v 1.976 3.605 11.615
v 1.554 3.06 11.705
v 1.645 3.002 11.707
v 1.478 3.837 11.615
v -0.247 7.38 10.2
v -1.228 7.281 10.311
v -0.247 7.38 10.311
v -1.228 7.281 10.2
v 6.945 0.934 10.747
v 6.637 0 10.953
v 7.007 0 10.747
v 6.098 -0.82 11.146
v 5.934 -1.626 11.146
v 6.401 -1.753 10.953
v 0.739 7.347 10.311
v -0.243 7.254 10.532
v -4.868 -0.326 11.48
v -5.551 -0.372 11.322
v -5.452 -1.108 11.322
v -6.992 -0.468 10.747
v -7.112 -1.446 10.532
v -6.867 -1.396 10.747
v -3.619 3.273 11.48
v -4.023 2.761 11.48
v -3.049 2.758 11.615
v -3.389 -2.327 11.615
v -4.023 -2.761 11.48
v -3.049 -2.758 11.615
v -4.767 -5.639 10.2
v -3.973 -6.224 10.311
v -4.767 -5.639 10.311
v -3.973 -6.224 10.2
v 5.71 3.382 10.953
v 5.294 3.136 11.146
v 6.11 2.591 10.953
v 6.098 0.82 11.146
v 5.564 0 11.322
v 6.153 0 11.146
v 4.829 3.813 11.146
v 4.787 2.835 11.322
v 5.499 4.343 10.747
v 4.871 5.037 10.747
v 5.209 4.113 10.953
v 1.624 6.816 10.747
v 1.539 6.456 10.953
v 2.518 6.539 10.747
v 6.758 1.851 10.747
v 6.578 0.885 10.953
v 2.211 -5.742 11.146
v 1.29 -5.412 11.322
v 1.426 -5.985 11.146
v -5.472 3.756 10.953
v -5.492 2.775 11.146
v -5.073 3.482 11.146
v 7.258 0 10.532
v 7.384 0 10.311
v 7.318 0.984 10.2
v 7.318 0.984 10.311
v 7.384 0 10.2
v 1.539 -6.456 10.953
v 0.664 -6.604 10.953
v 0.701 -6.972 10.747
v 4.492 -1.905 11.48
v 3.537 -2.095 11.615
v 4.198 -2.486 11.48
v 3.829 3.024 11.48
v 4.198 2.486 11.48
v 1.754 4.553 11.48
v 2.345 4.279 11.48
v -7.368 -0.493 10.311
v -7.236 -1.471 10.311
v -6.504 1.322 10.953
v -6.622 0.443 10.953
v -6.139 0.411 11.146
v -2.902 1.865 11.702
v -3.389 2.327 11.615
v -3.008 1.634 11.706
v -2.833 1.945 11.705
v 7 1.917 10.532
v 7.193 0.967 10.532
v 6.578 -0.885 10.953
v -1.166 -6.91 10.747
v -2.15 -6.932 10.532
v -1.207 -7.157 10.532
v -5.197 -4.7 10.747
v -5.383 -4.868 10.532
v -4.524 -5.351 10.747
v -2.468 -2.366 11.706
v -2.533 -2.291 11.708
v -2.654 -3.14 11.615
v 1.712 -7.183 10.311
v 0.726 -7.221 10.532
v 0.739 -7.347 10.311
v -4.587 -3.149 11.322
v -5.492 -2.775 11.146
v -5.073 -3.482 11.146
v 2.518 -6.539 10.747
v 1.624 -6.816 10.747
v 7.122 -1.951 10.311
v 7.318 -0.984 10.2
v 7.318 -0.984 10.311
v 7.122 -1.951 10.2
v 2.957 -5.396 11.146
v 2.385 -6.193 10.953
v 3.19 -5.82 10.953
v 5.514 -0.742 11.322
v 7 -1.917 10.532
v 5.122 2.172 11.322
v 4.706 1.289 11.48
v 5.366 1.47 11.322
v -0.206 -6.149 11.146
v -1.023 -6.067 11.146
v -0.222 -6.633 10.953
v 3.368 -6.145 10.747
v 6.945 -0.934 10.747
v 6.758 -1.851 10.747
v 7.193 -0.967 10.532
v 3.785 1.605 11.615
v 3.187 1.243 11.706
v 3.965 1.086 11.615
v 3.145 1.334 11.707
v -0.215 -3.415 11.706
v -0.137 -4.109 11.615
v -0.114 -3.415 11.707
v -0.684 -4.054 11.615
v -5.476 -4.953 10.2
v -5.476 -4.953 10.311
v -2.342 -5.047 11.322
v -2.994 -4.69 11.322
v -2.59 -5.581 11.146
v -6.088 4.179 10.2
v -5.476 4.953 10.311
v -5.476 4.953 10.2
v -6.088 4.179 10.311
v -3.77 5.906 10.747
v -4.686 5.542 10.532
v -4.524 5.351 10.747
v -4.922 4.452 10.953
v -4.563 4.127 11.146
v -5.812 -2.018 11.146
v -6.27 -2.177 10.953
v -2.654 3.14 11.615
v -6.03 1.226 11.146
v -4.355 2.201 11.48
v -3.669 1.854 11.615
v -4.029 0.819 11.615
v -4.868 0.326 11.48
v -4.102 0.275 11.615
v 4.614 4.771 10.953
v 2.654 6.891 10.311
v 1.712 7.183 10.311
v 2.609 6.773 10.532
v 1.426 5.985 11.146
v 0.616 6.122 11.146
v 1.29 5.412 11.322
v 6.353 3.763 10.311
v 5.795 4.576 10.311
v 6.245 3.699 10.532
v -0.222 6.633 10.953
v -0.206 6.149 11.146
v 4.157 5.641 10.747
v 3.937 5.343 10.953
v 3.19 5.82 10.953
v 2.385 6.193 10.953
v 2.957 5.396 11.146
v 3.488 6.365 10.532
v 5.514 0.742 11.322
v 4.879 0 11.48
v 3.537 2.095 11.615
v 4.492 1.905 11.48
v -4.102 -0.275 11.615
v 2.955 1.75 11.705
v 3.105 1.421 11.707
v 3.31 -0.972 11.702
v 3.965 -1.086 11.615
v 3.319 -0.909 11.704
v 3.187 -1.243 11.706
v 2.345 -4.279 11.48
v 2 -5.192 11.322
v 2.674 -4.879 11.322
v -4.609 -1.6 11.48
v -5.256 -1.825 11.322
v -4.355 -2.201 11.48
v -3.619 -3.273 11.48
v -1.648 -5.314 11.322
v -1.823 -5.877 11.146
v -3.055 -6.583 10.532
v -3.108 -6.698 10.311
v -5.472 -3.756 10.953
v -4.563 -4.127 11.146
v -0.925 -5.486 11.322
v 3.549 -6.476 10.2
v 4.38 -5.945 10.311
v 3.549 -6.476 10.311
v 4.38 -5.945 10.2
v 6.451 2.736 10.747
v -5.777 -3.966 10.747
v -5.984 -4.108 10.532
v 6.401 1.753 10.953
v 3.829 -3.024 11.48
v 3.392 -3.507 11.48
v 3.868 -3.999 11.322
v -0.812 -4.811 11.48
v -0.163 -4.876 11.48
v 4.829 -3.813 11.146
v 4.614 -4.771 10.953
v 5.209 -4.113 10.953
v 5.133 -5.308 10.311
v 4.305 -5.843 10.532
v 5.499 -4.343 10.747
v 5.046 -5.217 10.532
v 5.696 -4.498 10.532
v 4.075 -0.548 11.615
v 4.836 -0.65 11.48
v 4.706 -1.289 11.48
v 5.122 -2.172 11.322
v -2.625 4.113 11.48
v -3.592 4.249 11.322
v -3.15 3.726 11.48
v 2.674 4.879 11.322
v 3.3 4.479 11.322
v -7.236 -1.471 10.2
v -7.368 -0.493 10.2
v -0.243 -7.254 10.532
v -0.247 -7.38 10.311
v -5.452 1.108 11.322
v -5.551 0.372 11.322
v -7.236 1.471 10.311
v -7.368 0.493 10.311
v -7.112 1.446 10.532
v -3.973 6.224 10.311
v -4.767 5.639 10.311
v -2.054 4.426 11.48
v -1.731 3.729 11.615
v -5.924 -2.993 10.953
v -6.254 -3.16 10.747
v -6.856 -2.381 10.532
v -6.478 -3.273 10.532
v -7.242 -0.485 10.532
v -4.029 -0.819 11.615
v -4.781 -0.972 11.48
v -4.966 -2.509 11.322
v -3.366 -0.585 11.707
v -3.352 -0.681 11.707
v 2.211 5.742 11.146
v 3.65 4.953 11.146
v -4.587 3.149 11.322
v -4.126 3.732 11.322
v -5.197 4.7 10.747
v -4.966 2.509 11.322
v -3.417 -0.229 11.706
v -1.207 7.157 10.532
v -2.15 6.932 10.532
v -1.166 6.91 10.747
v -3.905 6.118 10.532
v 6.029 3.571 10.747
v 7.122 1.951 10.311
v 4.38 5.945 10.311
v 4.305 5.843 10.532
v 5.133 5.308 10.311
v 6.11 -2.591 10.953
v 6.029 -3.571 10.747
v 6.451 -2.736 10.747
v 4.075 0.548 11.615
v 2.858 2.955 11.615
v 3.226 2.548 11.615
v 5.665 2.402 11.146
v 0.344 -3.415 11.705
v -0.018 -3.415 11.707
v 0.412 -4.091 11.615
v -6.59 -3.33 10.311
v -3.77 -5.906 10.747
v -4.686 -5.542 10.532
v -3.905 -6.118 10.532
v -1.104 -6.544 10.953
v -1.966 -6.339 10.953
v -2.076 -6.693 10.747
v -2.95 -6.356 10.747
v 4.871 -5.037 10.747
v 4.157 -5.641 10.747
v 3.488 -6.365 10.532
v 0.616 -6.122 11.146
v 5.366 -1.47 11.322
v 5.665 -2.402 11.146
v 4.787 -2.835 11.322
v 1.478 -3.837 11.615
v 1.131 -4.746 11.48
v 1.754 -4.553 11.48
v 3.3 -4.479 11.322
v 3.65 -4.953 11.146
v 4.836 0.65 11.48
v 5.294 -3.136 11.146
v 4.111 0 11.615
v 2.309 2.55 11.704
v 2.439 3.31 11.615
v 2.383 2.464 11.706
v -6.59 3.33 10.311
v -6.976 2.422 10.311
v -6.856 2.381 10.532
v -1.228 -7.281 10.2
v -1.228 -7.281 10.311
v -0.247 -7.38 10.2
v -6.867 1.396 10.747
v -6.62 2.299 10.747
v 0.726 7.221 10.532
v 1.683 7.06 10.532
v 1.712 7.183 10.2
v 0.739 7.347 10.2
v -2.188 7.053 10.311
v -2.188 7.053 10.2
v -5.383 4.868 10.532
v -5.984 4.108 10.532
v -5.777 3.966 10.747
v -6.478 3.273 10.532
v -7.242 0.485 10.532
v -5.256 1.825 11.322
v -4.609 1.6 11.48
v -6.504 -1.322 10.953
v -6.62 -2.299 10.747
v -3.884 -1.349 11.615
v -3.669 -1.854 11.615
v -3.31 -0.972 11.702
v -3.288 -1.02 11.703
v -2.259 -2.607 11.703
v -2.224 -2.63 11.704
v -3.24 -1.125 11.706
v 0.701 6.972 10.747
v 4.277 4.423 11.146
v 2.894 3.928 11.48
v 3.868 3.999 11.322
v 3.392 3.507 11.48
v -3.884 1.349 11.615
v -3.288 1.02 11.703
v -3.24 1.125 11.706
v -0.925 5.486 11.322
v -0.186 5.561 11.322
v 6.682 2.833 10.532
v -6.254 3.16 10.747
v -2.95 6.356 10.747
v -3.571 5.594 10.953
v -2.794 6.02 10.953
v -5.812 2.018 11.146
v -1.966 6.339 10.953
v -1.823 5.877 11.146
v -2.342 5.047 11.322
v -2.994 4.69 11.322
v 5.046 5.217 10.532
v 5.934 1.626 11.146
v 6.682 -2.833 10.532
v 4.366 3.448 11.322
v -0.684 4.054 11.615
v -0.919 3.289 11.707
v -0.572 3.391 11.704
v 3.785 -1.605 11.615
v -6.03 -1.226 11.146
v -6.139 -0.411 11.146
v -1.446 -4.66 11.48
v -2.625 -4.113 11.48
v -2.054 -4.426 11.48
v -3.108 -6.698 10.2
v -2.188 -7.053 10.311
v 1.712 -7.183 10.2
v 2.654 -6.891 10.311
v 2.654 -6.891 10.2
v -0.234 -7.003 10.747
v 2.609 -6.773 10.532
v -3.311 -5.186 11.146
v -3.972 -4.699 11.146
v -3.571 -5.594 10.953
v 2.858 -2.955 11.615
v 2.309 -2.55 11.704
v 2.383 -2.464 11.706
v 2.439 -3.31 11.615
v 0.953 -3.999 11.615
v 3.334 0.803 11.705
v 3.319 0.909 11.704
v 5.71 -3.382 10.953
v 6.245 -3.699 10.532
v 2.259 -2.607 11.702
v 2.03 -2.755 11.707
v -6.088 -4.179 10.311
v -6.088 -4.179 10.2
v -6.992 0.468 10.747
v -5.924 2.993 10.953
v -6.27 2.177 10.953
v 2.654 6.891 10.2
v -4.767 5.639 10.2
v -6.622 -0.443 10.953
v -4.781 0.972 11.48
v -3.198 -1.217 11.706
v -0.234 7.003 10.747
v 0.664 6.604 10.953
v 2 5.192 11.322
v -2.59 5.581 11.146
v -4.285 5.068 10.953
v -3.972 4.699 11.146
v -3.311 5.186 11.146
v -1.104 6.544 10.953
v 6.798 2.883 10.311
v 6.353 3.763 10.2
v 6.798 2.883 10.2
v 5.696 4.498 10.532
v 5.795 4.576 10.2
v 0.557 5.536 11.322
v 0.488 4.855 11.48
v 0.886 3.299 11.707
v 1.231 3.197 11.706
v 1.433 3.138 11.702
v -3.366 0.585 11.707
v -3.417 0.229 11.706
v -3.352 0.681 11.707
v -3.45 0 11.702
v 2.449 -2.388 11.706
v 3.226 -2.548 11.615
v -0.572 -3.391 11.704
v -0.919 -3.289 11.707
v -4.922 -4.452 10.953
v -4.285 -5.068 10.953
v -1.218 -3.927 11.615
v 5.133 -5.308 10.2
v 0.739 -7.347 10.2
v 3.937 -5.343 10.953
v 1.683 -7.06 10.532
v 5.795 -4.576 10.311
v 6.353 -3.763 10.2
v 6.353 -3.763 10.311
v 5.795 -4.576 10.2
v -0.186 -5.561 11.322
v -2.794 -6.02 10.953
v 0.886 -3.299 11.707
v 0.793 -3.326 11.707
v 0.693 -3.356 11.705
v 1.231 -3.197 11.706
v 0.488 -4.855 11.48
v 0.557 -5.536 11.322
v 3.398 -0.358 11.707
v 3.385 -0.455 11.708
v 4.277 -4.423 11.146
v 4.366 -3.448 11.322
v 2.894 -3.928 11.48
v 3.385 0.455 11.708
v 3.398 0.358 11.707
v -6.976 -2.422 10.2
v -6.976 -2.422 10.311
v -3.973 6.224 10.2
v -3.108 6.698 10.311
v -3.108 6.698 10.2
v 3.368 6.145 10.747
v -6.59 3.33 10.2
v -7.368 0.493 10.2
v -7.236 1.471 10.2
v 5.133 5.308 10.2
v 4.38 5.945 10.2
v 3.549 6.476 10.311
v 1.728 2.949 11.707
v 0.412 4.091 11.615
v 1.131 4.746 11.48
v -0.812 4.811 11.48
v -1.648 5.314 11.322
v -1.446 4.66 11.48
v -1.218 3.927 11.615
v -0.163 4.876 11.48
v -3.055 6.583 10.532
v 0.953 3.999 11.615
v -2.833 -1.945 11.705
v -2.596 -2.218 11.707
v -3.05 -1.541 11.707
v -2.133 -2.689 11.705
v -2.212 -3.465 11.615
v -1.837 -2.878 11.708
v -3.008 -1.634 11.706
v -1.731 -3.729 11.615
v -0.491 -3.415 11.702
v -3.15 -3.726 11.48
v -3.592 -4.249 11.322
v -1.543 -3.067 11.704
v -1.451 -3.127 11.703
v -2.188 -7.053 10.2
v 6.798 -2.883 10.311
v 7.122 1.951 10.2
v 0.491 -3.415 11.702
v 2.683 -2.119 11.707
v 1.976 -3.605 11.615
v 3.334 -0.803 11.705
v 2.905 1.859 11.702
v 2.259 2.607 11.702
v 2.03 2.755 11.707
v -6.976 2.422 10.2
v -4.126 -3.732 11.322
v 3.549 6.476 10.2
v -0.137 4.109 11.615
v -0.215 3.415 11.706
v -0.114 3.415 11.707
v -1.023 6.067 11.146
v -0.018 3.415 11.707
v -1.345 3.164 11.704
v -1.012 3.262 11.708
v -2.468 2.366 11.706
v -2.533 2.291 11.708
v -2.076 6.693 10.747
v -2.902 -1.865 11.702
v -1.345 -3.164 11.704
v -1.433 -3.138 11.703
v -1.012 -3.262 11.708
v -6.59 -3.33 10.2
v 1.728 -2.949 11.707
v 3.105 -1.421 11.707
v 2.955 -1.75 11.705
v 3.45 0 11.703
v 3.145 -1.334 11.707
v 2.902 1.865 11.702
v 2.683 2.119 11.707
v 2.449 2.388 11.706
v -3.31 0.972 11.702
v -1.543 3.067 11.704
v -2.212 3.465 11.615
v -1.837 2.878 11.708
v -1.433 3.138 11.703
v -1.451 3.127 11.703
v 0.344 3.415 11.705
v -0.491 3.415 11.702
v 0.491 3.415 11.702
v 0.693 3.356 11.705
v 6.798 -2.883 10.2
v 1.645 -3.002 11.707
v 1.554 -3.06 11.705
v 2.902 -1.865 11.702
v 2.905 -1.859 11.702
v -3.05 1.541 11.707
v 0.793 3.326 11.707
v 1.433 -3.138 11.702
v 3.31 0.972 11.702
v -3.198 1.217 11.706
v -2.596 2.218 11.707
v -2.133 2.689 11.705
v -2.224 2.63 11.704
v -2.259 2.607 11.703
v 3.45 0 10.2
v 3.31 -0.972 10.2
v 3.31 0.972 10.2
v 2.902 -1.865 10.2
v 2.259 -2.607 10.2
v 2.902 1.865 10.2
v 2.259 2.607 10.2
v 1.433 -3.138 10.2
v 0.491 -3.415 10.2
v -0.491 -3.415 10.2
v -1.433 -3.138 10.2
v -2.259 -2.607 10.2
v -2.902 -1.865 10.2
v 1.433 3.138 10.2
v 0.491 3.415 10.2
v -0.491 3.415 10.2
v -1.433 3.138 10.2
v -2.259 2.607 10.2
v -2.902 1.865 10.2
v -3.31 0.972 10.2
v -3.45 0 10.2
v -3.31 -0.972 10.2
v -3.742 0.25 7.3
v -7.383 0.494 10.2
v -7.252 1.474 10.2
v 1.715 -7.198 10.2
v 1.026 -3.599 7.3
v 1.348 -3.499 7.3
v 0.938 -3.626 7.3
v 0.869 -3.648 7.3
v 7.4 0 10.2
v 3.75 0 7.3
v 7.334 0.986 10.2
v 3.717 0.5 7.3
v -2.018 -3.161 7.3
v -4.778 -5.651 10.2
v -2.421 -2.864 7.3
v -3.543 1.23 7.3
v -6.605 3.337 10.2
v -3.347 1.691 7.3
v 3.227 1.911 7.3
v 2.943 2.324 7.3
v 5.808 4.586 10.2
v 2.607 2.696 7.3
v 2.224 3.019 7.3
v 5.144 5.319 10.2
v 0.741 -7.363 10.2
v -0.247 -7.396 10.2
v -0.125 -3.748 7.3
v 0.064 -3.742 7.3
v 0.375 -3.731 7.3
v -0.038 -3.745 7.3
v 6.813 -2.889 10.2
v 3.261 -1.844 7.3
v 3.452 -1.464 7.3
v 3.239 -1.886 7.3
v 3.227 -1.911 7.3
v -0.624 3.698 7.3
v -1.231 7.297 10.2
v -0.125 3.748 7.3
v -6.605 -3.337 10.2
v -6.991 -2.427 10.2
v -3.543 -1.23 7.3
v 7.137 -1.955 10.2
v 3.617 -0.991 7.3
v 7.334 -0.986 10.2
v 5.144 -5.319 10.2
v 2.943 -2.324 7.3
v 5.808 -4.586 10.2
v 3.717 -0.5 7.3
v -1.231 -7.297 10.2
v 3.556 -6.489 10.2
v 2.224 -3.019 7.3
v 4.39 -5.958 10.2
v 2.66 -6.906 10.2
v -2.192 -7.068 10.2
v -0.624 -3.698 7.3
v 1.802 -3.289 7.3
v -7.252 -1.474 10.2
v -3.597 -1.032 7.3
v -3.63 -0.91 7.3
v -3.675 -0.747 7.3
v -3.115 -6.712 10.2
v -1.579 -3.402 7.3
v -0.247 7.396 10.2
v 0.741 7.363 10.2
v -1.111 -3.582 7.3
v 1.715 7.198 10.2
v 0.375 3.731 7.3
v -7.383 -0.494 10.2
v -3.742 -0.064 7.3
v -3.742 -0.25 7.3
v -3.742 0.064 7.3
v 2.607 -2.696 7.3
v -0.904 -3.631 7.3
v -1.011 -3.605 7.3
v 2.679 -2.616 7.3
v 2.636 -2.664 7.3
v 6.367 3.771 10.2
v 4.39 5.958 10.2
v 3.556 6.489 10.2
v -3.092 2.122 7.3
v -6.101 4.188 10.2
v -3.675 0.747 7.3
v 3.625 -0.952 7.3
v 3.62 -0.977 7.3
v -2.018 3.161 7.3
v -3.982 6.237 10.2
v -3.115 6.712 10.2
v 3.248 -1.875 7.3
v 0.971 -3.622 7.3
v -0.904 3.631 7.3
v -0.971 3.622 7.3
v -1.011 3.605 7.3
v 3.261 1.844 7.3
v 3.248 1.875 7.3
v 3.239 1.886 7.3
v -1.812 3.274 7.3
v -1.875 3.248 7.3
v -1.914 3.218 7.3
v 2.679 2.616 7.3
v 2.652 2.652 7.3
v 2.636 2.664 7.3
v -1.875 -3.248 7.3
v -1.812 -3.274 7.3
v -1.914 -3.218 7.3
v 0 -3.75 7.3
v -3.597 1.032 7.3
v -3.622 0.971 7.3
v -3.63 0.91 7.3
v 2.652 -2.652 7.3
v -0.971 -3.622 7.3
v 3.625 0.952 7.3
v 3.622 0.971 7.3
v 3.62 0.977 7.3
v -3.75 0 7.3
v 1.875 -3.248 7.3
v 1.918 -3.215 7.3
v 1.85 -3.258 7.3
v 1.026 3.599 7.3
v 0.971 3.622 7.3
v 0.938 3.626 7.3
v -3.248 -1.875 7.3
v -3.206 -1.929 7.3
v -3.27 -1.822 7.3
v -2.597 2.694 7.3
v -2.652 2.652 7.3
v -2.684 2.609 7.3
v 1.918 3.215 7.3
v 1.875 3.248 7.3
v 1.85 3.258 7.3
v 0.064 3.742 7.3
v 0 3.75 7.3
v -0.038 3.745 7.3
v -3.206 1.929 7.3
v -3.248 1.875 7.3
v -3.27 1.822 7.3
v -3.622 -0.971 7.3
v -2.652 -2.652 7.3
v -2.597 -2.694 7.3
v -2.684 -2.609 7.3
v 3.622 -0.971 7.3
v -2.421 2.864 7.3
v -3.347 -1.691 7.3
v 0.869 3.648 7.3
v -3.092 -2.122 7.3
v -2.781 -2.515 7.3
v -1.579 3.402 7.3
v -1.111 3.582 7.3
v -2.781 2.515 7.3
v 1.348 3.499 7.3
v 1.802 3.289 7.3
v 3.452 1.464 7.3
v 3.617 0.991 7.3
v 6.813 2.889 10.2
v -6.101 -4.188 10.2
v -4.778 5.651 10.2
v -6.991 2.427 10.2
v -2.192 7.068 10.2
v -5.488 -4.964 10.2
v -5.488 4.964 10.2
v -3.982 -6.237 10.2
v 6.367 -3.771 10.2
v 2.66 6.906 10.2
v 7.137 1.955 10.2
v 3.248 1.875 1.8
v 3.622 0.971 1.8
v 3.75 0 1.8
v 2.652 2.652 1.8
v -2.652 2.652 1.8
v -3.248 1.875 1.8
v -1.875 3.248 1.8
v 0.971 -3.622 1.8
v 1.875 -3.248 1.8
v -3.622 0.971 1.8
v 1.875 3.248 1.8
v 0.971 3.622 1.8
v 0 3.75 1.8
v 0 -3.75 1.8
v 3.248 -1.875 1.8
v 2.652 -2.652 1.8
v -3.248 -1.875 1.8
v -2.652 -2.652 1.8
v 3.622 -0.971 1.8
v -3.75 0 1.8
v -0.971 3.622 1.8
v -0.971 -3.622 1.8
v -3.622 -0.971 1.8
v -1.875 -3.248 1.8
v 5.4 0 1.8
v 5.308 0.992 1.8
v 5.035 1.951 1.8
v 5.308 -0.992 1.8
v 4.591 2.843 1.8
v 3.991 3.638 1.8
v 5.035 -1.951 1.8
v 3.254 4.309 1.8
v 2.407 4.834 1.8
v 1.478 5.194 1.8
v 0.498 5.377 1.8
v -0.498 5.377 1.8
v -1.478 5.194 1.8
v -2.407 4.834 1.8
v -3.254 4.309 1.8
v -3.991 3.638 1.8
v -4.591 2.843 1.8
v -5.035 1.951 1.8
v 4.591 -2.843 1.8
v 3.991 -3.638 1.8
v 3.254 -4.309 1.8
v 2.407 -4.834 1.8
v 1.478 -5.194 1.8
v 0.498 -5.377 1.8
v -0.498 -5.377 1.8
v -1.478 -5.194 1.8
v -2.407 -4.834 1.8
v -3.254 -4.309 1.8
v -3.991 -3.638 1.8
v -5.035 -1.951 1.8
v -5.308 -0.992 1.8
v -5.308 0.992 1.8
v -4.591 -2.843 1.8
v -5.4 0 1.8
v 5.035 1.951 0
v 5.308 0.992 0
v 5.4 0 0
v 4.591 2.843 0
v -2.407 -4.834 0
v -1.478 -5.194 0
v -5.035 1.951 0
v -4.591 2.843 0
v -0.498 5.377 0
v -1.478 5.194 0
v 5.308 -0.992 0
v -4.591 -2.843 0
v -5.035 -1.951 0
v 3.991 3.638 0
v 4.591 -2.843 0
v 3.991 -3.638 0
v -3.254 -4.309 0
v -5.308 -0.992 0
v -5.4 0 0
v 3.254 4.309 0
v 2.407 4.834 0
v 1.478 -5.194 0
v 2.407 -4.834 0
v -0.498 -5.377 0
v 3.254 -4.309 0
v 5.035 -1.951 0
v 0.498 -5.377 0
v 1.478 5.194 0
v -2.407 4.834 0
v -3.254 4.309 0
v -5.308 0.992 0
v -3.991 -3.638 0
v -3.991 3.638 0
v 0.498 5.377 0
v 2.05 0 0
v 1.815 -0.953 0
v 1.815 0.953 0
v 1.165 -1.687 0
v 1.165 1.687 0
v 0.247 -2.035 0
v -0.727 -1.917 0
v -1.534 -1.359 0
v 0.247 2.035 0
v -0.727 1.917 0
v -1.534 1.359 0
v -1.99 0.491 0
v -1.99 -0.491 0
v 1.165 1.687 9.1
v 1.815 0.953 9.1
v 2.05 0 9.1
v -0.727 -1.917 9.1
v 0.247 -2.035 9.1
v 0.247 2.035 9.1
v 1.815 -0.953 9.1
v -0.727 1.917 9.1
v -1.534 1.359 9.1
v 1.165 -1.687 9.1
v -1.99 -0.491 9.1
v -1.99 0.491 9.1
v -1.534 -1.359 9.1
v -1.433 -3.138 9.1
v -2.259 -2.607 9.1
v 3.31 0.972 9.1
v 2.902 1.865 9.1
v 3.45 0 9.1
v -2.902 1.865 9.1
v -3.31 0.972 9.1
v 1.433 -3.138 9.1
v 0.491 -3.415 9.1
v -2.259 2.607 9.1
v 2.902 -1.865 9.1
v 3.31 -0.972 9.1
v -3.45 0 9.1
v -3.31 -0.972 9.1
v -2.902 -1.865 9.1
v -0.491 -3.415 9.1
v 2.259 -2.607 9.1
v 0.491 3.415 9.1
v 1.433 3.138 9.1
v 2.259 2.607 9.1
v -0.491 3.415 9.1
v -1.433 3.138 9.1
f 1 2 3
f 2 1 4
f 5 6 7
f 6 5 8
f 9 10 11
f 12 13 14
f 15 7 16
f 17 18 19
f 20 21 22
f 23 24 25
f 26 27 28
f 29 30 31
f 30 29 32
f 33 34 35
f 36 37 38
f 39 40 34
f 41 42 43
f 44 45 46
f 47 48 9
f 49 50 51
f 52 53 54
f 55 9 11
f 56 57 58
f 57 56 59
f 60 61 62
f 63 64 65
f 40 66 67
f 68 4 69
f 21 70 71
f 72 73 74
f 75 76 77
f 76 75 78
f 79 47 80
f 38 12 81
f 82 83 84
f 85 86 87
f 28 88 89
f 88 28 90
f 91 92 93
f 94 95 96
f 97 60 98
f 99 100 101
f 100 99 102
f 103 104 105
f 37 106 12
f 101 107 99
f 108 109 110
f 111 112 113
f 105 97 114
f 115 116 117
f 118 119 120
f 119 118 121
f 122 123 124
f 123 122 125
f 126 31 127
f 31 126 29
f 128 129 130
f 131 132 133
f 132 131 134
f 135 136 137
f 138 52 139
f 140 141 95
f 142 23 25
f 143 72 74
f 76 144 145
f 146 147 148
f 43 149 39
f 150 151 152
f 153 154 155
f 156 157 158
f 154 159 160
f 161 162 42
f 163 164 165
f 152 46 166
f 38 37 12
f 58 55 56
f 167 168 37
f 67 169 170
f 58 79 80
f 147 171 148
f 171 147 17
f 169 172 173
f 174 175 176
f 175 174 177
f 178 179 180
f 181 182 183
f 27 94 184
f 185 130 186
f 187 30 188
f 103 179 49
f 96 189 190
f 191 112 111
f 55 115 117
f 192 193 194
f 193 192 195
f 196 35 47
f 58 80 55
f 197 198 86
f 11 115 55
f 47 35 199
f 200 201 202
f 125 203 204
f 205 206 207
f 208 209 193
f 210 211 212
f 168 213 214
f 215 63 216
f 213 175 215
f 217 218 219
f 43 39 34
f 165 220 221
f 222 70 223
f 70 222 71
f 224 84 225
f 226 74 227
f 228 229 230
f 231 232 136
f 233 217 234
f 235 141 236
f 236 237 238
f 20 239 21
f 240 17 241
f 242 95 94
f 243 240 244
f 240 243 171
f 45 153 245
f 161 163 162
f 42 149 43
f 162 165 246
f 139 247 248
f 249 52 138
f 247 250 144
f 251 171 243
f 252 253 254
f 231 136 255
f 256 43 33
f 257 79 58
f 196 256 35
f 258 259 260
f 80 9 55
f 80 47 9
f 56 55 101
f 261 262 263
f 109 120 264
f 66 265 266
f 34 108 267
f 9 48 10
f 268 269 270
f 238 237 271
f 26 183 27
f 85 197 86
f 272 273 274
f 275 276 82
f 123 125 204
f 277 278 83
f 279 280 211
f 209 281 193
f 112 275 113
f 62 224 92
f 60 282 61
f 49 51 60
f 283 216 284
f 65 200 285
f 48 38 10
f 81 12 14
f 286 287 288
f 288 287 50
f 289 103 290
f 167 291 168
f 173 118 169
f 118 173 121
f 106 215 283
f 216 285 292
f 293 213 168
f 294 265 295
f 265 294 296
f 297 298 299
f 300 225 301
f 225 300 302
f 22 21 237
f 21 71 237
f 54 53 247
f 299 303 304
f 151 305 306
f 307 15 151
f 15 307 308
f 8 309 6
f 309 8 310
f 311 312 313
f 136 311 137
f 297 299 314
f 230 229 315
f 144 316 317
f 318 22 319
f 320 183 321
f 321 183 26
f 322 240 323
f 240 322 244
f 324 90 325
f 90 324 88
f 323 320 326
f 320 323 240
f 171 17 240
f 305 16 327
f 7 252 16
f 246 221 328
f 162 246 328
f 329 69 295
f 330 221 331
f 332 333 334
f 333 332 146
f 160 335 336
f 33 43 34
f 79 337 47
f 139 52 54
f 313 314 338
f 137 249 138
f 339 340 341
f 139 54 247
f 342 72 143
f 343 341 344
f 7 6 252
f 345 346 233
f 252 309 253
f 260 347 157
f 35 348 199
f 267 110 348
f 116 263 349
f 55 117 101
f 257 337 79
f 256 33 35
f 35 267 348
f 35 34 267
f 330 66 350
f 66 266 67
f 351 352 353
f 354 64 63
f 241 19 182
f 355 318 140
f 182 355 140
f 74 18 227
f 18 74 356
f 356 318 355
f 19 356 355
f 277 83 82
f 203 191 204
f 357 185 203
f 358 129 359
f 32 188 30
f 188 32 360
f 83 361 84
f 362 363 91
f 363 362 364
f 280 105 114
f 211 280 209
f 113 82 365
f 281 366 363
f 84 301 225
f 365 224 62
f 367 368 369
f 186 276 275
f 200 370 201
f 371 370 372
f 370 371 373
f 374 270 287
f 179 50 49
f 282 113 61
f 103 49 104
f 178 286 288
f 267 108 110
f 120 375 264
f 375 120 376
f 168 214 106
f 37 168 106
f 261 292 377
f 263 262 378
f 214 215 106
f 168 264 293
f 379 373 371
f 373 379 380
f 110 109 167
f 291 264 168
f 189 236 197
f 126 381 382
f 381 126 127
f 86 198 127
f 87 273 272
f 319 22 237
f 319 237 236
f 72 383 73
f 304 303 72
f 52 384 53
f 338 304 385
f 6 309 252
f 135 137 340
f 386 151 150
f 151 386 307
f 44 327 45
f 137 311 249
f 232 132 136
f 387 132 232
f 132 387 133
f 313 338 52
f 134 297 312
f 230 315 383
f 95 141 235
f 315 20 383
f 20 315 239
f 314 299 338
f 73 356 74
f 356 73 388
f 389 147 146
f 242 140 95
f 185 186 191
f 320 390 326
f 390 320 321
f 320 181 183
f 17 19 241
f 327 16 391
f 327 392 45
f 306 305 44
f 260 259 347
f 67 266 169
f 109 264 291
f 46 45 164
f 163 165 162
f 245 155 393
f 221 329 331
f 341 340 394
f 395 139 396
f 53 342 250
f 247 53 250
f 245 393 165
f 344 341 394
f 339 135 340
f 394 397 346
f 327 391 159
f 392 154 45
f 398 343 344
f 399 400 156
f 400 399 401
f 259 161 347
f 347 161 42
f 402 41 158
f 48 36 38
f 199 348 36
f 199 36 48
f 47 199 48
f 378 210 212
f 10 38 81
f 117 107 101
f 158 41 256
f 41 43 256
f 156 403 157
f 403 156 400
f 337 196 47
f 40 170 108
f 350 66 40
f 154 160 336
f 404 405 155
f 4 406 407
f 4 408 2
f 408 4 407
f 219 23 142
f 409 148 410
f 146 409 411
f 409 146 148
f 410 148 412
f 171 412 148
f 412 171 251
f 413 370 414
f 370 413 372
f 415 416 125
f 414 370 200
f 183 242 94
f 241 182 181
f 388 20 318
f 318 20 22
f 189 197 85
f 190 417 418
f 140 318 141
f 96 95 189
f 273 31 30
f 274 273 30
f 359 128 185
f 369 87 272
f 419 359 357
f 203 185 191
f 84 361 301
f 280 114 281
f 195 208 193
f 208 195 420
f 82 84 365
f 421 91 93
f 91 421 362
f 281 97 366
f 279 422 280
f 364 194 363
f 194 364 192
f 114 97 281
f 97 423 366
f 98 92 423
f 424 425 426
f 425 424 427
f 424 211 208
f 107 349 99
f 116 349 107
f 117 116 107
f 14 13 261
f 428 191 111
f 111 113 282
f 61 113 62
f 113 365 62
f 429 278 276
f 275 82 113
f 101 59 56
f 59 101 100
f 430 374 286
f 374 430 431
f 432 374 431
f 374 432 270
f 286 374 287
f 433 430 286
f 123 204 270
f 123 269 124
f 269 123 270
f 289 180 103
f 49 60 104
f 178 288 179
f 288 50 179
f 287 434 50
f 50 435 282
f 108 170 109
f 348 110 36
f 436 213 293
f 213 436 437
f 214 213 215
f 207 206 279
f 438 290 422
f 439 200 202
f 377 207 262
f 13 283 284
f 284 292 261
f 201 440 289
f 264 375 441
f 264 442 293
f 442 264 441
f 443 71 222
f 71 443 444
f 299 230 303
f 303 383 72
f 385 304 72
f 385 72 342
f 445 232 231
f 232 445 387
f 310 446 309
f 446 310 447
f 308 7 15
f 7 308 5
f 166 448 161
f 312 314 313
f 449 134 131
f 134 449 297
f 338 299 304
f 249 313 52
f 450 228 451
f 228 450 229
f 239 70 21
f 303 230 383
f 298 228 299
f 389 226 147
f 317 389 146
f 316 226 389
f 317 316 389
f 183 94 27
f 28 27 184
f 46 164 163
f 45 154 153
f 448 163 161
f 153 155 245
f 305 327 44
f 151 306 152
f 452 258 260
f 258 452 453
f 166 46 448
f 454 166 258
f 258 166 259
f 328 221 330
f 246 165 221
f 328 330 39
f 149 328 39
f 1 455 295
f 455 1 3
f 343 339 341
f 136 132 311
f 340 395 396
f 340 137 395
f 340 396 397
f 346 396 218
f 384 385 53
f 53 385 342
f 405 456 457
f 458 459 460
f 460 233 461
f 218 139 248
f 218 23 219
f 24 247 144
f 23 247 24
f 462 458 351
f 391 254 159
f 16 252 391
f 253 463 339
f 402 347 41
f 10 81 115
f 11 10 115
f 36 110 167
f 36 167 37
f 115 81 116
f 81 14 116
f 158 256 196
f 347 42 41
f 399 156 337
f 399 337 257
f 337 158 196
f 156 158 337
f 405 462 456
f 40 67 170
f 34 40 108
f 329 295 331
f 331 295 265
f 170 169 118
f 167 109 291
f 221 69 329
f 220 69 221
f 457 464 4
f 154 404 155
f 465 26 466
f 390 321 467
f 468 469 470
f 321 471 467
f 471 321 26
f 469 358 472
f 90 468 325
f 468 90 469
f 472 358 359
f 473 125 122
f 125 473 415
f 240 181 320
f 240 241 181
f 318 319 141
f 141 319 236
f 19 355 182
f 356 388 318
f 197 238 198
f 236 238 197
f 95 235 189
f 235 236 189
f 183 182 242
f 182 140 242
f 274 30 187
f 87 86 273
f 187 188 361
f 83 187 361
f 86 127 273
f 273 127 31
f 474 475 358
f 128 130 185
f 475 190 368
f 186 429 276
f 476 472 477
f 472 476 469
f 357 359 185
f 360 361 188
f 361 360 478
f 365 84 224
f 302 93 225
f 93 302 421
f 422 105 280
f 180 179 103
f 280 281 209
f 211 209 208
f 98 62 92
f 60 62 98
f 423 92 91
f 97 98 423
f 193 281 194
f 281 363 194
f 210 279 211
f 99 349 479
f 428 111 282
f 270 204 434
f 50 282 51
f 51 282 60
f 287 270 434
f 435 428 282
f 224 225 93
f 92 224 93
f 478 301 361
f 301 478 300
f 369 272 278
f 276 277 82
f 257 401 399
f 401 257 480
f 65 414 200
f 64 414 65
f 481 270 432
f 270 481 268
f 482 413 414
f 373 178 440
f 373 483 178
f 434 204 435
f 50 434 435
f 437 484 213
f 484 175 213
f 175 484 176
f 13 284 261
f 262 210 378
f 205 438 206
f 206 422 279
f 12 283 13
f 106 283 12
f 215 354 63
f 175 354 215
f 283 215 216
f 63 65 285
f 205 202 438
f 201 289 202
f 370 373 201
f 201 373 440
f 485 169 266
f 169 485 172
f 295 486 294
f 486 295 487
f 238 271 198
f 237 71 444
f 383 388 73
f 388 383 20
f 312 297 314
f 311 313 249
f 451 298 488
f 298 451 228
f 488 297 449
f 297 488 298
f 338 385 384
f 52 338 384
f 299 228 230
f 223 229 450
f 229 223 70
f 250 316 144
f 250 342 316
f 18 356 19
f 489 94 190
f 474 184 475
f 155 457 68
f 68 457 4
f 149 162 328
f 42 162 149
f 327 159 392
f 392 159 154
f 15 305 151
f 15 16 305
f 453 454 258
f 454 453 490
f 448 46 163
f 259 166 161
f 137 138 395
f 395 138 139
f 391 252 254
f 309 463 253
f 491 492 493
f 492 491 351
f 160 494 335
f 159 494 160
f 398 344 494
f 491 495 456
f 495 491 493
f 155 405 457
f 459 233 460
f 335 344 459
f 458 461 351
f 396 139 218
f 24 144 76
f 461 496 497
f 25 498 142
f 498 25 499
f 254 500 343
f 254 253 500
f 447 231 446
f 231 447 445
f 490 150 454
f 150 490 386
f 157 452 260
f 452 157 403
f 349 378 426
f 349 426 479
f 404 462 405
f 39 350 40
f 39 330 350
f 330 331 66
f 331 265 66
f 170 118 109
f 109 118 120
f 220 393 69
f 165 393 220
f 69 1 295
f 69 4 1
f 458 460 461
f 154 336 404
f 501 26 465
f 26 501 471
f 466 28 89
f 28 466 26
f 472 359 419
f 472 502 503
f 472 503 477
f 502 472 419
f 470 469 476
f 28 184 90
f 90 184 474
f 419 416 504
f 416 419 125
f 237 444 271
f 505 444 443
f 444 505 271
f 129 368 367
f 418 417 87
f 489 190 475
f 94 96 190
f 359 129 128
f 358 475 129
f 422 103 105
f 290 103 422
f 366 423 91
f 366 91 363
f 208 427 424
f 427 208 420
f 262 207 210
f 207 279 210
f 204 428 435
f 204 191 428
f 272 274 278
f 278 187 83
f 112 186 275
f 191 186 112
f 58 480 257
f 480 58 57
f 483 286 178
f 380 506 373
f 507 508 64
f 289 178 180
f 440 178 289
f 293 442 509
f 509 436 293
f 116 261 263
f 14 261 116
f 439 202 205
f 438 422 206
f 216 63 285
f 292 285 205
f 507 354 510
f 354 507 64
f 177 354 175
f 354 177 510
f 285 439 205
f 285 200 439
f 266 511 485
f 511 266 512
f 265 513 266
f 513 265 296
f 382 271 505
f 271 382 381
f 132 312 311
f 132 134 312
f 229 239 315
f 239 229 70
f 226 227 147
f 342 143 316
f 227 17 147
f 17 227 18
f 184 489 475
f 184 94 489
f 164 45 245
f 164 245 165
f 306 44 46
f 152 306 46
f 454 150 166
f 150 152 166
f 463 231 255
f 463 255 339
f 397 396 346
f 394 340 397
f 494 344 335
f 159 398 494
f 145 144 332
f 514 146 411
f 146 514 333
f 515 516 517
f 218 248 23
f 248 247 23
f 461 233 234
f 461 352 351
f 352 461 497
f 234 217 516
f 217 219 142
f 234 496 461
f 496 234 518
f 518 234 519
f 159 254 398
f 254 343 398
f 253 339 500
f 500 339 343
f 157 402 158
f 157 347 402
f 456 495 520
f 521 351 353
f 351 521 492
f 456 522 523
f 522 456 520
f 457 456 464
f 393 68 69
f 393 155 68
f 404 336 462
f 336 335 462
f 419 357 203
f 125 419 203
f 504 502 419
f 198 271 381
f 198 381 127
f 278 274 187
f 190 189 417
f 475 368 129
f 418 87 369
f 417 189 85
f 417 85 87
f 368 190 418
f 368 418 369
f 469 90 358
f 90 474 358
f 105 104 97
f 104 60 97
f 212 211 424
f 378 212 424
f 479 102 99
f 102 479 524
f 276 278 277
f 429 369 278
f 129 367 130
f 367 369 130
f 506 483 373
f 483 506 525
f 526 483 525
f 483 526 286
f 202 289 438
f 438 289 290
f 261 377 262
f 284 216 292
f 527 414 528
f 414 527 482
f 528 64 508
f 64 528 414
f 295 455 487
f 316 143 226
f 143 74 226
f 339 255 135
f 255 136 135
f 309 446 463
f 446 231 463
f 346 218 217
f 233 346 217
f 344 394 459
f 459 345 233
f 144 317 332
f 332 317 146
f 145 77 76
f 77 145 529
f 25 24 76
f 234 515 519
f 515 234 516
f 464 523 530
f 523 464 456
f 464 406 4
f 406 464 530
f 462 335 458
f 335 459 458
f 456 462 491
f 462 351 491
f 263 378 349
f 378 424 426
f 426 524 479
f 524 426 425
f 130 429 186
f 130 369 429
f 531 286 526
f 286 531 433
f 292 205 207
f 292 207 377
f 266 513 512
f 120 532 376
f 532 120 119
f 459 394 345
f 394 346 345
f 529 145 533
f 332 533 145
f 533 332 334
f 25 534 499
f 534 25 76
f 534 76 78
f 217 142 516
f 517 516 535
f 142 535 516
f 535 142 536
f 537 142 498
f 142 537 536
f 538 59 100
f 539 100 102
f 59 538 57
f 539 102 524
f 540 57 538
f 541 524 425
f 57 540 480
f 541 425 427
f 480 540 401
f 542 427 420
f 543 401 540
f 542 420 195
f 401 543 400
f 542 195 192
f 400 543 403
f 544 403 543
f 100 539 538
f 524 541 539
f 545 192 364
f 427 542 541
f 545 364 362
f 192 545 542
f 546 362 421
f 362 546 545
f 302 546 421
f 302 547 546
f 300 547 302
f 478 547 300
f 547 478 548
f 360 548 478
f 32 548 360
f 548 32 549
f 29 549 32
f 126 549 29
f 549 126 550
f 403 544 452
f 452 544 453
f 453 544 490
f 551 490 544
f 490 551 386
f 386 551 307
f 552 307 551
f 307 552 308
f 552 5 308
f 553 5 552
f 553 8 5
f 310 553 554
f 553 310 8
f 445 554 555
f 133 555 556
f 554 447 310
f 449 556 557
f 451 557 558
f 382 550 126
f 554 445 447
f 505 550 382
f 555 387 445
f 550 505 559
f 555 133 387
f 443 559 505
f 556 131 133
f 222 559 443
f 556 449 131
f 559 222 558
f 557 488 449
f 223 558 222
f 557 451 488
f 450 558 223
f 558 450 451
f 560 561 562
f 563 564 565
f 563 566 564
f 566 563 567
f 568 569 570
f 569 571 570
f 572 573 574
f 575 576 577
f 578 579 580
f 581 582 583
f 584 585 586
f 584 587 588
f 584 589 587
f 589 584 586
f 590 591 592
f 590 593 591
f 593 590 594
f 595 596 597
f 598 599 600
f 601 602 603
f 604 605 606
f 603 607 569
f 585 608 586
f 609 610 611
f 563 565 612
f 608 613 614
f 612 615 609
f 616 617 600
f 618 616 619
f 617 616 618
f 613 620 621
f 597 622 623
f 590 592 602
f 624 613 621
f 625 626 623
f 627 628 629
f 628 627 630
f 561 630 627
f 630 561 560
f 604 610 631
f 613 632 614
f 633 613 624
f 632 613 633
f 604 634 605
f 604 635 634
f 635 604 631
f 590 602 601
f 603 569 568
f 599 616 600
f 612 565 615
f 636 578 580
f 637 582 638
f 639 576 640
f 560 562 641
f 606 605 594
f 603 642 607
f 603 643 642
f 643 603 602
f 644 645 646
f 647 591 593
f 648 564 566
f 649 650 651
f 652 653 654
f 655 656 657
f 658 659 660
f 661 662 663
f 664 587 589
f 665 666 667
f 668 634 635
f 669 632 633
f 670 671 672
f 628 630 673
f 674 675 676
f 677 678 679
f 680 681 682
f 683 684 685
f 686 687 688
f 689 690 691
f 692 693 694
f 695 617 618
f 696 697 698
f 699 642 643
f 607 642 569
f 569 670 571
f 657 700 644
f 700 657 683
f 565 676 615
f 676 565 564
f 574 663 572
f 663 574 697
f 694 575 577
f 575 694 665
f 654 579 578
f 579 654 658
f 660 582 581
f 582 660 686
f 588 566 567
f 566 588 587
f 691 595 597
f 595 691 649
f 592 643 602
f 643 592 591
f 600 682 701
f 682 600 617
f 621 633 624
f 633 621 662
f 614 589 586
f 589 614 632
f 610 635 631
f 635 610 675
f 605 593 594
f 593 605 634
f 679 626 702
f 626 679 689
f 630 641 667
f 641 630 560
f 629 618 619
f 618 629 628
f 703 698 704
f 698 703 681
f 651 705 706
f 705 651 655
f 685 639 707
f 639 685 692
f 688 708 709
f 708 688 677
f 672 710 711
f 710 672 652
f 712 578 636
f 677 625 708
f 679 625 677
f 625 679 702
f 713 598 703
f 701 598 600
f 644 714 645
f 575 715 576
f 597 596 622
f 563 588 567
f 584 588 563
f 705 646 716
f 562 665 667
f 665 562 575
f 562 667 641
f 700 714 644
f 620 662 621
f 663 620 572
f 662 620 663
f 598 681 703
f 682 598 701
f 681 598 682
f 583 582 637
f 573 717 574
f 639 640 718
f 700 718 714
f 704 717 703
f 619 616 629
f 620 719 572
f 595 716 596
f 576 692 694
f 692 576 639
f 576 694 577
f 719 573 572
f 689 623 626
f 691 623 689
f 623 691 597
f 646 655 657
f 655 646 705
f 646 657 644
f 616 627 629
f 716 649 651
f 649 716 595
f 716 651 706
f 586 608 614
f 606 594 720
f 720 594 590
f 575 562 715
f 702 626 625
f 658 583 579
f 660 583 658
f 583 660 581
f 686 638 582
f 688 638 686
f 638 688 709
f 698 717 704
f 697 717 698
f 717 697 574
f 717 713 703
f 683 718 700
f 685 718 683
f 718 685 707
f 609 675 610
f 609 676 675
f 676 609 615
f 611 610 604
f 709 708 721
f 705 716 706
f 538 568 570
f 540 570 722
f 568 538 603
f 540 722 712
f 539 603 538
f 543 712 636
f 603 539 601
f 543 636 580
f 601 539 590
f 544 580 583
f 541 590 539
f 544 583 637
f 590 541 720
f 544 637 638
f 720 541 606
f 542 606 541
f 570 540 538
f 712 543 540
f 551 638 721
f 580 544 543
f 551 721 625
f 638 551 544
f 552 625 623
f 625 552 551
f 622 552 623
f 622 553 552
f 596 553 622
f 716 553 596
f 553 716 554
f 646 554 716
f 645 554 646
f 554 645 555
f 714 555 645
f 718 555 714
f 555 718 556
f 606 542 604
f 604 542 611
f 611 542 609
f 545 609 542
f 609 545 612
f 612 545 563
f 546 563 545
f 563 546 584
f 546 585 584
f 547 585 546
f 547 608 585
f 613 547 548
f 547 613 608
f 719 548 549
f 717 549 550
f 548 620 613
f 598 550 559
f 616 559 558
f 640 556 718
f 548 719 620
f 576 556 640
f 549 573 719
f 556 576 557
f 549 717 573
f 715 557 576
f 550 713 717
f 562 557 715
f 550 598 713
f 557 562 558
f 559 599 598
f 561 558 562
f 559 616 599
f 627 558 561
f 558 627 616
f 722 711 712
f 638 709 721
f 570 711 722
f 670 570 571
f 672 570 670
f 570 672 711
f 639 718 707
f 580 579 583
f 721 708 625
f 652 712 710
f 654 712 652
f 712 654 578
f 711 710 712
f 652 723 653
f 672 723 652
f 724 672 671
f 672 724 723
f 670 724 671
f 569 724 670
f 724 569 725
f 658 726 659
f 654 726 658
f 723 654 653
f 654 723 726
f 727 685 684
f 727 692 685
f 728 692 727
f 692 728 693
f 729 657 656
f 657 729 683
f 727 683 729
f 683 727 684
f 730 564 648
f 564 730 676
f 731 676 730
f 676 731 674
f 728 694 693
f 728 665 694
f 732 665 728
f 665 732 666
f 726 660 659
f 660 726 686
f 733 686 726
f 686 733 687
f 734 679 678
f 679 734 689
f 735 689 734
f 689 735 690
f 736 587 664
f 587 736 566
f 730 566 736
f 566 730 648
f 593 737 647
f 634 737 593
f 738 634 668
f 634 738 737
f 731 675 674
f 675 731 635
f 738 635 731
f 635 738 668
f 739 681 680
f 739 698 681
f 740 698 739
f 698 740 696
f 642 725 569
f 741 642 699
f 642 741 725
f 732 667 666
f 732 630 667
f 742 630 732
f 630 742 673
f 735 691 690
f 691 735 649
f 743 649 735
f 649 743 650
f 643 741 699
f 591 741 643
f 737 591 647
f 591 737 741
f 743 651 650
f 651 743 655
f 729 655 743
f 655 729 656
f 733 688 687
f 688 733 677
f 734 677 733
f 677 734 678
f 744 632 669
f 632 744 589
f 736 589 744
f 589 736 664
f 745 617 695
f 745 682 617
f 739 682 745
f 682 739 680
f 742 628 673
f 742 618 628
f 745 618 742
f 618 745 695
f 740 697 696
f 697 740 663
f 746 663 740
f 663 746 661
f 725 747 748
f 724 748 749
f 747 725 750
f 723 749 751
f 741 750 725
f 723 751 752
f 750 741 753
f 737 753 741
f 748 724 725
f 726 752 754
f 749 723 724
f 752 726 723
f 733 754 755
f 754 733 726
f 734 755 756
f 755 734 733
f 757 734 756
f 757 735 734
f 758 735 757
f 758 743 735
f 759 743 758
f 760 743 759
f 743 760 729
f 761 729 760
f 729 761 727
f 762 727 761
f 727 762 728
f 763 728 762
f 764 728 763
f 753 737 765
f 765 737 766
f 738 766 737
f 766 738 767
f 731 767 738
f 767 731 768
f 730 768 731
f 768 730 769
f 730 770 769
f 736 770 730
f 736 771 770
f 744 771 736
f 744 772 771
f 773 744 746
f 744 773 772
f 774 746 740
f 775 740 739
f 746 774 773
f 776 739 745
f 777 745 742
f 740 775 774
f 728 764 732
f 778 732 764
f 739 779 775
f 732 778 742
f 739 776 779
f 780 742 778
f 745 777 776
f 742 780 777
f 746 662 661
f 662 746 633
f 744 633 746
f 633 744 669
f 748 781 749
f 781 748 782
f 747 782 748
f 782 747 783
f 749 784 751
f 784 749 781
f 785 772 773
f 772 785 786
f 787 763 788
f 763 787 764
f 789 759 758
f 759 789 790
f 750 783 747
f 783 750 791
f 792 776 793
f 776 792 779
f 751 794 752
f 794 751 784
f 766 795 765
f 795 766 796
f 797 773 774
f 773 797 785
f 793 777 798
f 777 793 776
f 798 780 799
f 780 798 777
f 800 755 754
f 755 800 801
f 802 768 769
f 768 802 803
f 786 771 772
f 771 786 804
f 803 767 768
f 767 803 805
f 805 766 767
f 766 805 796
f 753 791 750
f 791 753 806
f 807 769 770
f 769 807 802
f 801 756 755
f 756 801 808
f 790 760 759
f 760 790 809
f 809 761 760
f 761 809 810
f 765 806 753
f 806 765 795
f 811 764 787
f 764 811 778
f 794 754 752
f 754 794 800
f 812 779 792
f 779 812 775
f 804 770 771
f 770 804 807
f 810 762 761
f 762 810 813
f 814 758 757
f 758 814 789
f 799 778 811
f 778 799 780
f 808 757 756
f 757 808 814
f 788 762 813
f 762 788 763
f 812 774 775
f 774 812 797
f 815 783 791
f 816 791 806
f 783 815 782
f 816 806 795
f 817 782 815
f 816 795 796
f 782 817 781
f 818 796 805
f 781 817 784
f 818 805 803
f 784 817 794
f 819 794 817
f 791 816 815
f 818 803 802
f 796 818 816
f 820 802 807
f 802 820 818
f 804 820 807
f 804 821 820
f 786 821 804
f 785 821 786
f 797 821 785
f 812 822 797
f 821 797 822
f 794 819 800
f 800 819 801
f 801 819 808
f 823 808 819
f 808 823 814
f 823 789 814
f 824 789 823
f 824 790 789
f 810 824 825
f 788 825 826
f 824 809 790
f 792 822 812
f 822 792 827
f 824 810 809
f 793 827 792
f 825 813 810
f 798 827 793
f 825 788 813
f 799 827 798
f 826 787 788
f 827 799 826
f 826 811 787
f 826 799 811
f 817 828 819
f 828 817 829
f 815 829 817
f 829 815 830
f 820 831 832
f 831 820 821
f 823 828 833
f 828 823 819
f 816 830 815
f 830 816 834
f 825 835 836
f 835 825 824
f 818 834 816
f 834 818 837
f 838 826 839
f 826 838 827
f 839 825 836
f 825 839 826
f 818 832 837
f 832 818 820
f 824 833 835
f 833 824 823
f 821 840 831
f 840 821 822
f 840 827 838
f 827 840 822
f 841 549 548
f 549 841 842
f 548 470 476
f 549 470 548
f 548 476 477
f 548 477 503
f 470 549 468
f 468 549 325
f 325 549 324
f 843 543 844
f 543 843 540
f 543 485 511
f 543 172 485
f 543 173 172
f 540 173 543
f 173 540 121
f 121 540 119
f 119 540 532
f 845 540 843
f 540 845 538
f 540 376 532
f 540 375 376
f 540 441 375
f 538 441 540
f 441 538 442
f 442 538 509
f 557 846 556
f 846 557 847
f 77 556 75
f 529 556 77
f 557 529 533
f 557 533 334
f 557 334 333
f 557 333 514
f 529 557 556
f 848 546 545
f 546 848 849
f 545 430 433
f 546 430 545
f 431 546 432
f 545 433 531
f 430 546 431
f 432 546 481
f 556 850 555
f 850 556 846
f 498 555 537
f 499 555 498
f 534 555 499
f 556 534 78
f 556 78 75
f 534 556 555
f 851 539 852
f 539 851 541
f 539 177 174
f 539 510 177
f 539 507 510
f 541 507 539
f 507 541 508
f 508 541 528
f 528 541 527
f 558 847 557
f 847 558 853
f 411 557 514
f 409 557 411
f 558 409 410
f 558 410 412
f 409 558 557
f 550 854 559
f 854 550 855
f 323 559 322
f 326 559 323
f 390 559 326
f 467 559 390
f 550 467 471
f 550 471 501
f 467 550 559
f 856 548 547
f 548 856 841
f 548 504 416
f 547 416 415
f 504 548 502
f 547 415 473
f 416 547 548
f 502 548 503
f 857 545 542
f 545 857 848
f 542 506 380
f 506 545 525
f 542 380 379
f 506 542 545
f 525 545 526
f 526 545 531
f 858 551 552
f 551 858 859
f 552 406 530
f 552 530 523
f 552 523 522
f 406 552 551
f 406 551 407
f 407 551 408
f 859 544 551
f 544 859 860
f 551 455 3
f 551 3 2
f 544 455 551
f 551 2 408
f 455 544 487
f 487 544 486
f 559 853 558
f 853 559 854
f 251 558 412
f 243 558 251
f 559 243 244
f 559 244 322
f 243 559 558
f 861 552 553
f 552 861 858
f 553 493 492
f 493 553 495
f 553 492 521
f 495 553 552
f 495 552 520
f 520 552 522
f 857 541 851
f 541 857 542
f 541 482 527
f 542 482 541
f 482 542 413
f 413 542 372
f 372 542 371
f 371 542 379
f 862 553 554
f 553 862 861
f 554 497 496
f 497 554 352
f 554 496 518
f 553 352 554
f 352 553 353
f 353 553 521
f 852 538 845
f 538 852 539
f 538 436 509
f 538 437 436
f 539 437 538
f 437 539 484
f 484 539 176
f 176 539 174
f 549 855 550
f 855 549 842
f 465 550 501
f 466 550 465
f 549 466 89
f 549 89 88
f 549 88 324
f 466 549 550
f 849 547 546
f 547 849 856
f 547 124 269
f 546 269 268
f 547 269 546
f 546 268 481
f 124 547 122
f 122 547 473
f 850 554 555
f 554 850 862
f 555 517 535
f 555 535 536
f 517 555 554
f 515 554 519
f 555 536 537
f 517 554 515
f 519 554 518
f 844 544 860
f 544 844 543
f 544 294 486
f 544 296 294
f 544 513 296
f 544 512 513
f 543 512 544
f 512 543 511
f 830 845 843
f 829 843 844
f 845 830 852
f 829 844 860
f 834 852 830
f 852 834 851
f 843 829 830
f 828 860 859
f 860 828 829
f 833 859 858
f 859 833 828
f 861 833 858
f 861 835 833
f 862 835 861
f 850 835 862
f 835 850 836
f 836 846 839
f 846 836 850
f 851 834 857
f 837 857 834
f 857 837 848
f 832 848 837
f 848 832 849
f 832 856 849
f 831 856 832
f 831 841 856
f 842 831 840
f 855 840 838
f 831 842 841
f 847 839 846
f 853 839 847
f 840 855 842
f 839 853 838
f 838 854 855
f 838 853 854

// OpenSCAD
/**
 * Strap button for a child's guitar. 13mm tall, ~15mm wide at the widest.
 */

$fa = 1;
$fs = 1;

module strap_button() {
	current_height = 0;

	difference() {
		union() {
			// Bottom ridge
			translate([0, 0, current_height]) cylinder(r=5.4, h=1.8);
		
			assign(current_height = current_height + 1.8) {
			
				// Thin part.
				translate([0, 0, current_height]) cylinder(r=3.75, h=5.5);
				assign(current_height = current_height + 5.5) {
					translate([0, 0, current_height]) cylinder(r1=3.75, r2=7.4, h=2.9);
					assign(current_height = current_height + 2.9) {
						translate([0, 0, current_height]) difference() {
							scale([1, 1, .23]) sphere(r=7.4);
							translate([0, 0, -7.4]) cube([14.8, 14.8, 14.8], true);
						};
					};
					
				};
			};
		}

		cylinder(r=2.05, h=13);
		translate([0, 0, 9.1]) cylinder(r=3.45, h=3);
	};
}

strap_button();
